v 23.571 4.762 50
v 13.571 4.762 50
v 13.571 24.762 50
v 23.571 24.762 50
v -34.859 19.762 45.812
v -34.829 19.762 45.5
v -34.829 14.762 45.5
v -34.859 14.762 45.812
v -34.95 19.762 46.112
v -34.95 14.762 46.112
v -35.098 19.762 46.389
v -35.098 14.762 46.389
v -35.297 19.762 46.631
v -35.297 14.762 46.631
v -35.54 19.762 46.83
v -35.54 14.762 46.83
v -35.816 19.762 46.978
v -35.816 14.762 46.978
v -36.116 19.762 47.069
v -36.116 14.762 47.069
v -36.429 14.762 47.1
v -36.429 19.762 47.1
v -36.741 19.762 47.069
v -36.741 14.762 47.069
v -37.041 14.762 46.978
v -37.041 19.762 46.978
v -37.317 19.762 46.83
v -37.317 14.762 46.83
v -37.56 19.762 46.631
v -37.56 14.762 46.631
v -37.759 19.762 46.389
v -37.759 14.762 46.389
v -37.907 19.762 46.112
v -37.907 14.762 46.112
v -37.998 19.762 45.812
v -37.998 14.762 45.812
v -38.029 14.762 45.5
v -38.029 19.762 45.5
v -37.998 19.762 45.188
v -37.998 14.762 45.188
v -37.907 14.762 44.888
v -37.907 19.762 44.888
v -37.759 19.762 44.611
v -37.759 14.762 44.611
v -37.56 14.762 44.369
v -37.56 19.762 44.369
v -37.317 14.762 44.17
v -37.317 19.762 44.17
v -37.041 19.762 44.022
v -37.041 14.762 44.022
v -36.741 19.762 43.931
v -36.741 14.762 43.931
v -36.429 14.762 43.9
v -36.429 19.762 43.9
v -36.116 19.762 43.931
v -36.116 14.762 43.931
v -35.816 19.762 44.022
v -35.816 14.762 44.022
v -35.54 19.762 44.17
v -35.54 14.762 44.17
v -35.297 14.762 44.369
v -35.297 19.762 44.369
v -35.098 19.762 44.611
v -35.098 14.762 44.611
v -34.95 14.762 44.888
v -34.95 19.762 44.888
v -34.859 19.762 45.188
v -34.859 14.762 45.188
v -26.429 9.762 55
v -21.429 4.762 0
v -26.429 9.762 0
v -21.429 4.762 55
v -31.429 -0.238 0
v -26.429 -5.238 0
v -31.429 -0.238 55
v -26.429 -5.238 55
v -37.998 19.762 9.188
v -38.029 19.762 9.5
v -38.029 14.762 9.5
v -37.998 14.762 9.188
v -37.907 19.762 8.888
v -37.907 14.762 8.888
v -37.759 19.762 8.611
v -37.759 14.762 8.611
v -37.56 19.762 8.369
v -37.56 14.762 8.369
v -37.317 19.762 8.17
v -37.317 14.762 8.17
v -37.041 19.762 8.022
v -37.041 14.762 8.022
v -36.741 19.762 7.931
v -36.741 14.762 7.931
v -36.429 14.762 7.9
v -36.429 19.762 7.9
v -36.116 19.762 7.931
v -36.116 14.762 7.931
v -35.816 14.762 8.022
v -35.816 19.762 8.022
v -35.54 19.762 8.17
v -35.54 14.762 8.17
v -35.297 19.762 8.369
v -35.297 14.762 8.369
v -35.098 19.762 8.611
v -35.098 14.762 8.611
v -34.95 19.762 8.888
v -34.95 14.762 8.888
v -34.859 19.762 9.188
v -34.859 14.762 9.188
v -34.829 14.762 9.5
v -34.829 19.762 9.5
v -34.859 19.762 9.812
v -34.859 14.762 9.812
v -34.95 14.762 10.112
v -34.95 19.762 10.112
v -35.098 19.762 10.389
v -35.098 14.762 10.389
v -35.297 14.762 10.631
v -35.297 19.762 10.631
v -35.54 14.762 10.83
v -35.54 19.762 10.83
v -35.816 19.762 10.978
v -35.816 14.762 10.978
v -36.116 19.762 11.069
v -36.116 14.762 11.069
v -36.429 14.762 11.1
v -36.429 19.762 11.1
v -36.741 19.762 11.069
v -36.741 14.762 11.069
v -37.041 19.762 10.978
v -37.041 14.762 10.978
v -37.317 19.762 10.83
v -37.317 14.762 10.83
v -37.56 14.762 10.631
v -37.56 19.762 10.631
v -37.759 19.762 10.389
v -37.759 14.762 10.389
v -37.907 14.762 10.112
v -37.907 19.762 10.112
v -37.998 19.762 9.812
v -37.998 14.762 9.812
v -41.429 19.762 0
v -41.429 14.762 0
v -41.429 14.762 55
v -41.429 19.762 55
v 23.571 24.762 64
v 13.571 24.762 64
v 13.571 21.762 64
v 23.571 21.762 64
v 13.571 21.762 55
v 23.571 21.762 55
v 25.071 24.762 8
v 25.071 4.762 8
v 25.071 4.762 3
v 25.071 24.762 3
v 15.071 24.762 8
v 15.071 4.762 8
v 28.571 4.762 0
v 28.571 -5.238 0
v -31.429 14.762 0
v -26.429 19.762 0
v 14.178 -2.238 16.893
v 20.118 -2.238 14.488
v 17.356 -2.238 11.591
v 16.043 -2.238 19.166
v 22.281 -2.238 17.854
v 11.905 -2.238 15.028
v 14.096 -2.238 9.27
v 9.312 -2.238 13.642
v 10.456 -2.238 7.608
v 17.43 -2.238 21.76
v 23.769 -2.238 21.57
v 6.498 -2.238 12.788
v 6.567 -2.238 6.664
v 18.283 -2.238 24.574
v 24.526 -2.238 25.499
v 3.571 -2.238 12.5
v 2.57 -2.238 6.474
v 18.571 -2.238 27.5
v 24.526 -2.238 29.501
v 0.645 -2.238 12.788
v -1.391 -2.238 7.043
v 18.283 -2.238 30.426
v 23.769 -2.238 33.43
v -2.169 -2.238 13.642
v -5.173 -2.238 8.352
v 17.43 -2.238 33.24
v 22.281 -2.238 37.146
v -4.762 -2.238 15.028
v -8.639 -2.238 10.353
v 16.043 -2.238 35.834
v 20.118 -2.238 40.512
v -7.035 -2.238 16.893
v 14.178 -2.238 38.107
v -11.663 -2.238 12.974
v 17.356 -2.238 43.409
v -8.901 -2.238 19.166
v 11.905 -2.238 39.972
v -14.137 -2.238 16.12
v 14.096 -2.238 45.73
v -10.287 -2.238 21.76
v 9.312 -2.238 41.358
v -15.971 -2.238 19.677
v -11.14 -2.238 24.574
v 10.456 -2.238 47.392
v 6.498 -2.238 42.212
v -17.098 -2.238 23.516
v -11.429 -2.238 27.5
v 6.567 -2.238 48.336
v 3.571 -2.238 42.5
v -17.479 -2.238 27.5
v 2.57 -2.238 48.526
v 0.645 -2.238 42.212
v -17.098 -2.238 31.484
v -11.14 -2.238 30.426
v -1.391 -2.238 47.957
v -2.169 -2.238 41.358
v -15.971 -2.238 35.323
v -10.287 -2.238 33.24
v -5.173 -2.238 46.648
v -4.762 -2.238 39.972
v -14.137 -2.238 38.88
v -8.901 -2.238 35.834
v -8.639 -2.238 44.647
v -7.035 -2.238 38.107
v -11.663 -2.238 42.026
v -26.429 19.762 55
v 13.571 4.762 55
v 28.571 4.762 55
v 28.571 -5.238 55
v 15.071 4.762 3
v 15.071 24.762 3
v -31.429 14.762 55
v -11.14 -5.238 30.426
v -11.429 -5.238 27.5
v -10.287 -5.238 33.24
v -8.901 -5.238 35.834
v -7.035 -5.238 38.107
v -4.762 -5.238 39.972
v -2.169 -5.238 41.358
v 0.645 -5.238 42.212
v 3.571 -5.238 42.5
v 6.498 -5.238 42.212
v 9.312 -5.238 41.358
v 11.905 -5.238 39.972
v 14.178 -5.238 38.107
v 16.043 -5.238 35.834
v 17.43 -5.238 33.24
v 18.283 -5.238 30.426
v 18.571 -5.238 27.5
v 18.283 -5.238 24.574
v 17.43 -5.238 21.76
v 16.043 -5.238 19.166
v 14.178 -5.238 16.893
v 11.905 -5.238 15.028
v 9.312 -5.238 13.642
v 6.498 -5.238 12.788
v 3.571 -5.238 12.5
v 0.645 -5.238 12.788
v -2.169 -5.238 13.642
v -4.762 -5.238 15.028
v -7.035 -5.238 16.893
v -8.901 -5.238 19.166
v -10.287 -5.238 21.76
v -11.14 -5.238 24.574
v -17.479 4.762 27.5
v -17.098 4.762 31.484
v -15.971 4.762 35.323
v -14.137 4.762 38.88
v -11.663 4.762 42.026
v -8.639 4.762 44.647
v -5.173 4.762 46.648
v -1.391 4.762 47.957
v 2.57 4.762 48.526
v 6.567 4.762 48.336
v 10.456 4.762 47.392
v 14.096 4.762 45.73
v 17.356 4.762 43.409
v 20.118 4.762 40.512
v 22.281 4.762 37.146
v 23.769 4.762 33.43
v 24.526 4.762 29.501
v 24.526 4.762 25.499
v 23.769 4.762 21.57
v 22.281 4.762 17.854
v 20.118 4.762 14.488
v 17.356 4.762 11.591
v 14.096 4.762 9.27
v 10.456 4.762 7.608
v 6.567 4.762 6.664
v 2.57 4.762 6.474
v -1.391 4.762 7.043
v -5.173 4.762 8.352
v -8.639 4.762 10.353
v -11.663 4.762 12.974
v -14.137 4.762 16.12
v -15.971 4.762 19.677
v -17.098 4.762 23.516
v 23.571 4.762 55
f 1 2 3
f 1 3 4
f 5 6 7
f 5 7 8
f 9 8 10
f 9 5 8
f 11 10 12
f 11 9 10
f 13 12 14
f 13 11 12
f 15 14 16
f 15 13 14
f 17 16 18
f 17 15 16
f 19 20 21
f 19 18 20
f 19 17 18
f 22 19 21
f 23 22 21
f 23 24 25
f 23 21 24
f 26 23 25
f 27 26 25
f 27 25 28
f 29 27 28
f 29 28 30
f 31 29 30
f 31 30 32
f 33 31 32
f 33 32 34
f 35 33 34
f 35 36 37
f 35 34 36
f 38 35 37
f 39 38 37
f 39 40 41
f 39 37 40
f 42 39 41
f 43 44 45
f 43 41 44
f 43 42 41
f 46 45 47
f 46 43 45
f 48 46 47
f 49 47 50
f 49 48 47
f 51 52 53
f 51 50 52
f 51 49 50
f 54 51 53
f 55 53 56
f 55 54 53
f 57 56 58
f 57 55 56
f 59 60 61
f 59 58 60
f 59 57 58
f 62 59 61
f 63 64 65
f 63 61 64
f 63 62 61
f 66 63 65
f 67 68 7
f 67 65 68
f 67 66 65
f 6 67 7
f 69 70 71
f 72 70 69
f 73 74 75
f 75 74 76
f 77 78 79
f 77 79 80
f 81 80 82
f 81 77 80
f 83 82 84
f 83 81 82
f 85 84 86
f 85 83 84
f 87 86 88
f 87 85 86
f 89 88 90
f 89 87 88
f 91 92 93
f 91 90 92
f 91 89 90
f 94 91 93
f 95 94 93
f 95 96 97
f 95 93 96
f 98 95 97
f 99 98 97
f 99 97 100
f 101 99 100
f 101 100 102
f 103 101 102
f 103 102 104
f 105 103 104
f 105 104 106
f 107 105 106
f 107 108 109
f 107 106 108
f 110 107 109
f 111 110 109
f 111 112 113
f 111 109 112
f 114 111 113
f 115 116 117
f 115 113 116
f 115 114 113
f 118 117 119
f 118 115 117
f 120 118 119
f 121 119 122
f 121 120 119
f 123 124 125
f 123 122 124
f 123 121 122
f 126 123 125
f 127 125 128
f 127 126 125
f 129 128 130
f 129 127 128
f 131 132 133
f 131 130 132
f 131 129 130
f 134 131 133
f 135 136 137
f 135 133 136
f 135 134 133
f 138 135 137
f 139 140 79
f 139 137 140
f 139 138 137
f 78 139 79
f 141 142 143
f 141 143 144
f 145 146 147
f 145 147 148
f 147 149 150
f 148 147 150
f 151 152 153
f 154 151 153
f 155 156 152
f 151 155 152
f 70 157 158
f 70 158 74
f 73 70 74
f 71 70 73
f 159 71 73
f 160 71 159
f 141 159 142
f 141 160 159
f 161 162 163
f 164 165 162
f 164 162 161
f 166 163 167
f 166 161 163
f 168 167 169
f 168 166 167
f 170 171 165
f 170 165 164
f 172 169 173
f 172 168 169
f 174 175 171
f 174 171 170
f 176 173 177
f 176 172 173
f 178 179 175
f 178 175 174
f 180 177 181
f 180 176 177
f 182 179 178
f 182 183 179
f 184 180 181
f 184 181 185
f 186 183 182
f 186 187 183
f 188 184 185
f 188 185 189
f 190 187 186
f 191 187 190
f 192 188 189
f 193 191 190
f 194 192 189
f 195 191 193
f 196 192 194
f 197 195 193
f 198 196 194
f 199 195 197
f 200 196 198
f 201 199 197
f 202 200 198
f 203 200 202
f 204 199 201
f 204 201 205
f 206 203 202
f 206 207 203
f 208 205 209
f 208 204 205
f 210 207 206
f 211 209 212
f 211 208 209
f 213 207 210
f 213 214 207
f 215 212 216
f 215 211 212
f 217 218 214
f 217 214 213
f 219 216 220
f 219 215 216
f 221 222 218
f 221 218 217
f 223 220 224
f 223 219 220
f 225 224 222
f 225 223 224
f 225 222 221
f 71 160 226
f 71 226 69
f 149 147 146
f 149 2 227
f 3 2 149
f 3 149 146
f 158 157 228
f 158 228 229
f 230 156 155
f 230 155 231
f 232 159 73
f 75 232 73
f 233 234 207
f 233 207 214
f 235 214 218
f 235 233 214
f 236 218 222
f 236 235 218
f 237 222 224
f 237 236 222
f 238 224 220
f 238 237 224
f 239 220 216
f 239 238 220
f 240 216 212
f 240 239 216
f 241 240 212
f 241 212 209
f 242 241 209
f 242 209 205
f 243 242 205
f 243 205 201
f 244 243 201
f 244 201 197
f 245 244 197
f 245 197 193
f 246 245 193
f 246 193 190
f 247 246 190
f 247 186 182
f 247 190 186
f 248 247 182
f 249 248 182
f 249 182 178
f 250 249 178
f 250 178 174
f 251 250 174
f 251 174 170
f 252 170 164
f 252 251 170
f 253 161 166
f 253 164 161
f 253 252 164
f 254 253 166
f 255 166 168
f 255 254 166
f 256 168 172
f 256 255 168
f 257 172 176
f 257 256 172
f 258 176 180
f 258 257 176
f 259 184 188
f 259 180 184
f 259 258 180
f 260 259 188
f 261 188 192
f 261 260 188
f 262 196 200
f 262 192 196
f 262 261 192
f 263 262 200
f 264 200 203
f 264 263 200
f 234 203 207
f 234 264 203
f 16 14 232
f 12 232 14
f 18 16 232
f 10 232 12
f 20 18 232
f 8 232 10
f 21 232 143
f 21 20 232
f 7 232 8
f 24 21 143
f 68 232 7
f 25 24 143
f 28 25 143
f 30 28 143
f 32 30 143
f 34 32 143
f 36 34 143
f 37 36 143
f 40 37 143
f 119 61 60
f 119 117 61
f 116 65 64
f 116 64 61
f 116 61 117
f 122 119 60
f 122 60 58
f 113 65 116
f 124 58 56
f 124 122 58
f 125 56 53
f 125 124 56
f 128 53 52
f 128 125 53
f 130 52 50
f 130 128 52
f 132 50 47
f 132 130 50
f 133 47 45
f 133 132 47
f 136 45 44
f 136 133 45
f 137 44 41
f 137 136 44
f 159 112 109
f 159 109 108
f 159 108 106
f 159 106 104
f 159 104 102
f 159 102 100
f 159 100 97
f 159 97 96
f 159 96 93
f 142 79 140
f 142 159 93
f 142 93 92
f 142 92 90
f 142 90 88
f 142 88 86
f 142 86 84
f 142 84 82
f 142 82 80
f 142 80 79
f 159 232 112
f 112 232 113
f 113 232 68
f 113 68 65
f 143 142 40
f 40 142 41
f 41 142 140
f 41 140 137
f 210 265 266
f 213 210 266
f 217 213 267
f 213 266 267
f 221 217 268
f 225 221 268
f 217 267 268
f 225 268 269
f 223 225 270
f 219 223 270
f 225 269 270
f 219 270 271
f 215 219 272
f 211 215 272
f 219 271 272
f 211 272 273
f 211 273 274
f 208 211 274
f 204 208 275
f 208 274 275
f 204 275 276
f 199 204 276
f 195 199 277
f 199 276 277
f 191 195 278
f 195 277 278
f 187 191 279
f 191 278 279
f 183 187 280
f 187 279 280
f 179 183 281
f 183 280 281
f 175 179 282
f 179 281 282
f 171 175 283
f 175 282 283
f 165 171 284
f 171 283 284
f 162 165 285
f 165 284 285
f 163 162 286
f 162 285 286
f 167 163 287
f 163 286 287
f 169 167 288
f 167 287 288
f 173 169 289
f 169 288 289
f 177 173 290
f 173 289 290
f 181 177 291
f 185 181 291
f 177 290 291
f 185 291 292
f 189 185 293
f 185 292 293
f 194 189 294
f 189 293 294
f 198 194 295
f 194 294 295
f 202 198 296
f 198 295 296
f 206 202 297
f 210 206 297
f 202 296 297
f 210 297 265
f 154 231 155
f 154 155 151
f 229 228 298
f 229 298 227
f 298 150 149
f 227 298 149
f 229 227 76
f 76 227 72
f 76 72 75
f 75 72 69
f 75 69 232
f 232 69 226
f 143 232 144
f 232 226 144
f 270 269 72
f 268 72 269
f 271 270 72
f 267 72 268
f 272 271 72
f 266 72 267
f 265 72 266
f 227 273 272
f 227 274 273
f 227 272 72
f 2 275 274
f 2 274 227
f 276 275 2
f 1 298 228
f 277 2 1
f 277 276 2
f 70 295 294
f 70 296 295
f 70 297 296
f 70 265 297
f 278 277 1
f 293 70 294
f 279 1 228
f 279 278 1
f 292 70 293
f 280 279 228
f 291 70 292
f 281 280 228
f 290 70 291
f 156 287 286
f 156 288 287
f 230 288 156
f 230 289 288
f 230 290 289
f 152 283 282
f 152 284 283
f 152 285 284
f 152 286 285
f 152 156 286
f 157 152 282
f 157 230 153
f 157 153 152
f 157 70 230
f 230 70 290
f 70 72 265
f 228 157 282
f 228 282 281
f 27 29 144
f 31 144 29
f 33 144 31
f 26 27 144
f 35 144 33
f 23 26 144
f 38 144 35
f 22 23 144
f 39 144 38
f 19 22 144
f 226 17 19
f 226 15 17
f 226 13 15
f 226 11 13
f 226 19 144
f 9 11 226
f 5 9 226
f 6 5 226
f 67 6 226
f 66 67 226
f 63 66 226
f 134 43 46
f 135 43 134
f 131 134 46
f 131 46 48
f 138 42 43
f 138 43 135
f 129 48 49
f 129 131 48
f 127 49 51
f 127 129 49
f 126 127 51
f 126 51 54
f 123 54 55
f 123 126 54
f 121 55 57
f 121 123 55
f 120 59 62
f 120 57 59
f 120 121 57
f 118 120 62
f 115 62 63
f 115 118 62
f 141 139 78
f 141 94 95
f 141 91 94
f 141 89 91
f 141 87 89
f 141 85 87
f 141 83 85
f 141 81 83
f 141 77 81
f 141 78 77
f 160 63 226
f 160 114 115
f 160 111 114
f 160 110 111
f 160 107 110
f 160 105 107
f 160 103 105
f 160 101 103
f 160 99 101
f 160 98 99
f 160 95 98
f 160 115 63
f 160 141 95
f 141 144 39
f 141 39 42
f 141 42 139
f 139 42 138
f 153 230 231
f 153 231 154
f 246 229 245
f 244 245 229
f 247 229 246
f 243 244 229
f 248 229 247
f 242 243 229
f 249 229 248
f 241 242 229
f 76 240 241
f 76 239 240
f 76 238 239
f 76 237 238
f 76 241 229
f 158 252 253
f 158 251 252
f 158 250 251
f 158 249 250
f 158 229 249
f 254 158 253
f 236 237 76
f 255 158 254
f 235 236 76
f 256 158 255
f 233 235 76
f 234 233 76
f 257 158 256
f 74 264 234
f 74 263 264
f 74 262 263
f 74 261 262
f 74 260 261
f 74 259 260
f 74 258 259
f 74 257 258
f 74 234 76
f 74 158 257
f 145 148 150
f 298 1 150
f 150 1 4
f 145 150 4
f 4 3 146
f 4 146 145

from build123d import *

# Parameters (mm, degrees)
SALIENTE_EXTRUIR2_DEPTH    = 55
CROQUIS6_R                 = 21.05
CORTAR_EXTRUIR1_DEPTH      = 7
CORTAR_EXTRUIR2_DEPTH      = 73.286420098
CORTAR_EXTRUIR2_DEPTH_BACK = 73.286420098
CROQUIS8_R                 = 15
CORTAR_EXTRUIR3_DEPTH      = 72.703044082
CORTAR_EXTRUIR3_DEPTH_BACK = 72.703044082
CROQUIS9_R                 = 1.6
CHAFL_N1_SIZE              = 5
CROQUIS11_W                = 10
CROQUIS11_H                = 5
SALIENTE_EXTRUIR3_DEPTH    = 20
CROQUIS12_W                = 10
CROQUIS12_H                = 3
SALIENTE_EXTRUIR4_DEPTH    = 9
CROQUIS13_W                = 10
CROQUIS13_H                = 5
SALIENTE_EXTRUIR5_DEPTH    = 20


with BuildPart() as part:
    # Croquis4 → Saliente-Extruir2 (new body)
    with BuildSketch(Plane.XY):
        Polygon((-31.428571429, 5.761904762), (-31.428571429, 14.761904762), (-41.428571429, 14.761904762), (-41.428571429, 19.761904762), (-26.428571429, 19.761904762), (-26.428571429, 4.761904762), (28.571428571, 4.761904762), (28.571428571, -5.238095238), (-31.428571429, -5.238095238), align=None)
    extrude(amount=SALIENTE_EXTRUIR2_DEPTH)

    # Croquis6 → Cortar-Extruir1 (cut)
    with BuildSketch(Plane(origin=(0, 4.761904762, 0), x_dir=(1, 0, 0), z_dir=(0, 1, 0))):
        with Locations(Location((3.571428571, -27.5, 0), (0, 0, 180))):
            Circle(CROQUIS6_R)
    extrude(amount=-CORTAR_EXTRUIR1_DEPTH, mode=Mode.SUBTRACT)

    # Croquis8 → Cortar-Extruir2 (cut, two sides: drawn at the far end of the back side and taken through both)
    with BuildSketch(Plane(origin=(0, -2.238095238, 0), x_dir=(1, 0, 0), z_dir=(0, 1, 0)).offset(-CORTAR_EXTRUIR2_DEPTH_BACK)):
        with Locations(Location((3.571428571, -27.5, 0), (0, 0, 180))):
            Circle(CROQUIS8_R)
    extrude(amount=CORTAR_EXTRUIR2_DEPTH + CORTAR_EXTRUIR2_DEPTH_BACK, mode=Mode.SUBTRACT)

    # Croquis9 → Cortar-Extruir3 (cut, two sides: drawn at the far end of the back side and taken through both)
    with BuildSketch(Plane.XZ.offset(-14.761904762).offset(-CORTAR_EXTRUIR3_DEPTH_BACK)):
        with Locations((-36.428571429, 45.5)):
            Circle(CROQUIS9_R)
        with Locations(Location((-36.428571429, 9.5, 0), (0, 0, 180))):
            Circle(CROQUIS9_R)
    extrude(amount=CORTAR_EXTRUIR3_DEPTH + CORTAR_EXTRUIR3_DEPTH_BACK, mode=Mode.SUBTRACT)

    # Chaflán1
    chafl_n1_edges = [part.edges().sort_by_distance(p)[0] for p in [
        (-31.428571429, -5.238095238, 27.5),
        (-26.428571429, 4.761904762, 27.5),
    ]]
    chamfer(chafl_n1_edges, length=CHAFL_N1_SIZE)

    # Croquis11 → Saliente-Extruir3 (add)
    with BuildSketch(Plane(origin=(0, 4.761904762, 0), x_dir=(1, 0, 0), z_dir=(0, 1, 0))):
        with Locations((18.571428571, -52.5)):
            Rectangle(CROQUIS11_W, CROQUIS11_H)
    extrude(amount=SALIENTE_EXTRUIR3_DEPTH)

    # Croquis12 → Saliente-Extruir4 (add)
    with BuildSketch(Plane.XY.offset(55)):
        with Locations((18.571428571, 23.261904762)):
            Rectangle(CROQUIS12_W, CROQUIS12_H)
    extrude(amount=SALIENTE_EXTRUIR4_DEPTH)

    # Croquis13 → Saliente-Extruir5 (add)
    with BuildSketch(Plane(origin=(0, 4.761904762, 0), x_dir=(1, 0, 0), z_dir=(0, 1, 0))):
        with Locations((20.071428571, -5.5)):
            Rectangle(CROQUIS13_W, CROQUIS13_H)
    extrude(amount=SALIENTE_EXTRUIR5_DEPTH)


solid = part.part
